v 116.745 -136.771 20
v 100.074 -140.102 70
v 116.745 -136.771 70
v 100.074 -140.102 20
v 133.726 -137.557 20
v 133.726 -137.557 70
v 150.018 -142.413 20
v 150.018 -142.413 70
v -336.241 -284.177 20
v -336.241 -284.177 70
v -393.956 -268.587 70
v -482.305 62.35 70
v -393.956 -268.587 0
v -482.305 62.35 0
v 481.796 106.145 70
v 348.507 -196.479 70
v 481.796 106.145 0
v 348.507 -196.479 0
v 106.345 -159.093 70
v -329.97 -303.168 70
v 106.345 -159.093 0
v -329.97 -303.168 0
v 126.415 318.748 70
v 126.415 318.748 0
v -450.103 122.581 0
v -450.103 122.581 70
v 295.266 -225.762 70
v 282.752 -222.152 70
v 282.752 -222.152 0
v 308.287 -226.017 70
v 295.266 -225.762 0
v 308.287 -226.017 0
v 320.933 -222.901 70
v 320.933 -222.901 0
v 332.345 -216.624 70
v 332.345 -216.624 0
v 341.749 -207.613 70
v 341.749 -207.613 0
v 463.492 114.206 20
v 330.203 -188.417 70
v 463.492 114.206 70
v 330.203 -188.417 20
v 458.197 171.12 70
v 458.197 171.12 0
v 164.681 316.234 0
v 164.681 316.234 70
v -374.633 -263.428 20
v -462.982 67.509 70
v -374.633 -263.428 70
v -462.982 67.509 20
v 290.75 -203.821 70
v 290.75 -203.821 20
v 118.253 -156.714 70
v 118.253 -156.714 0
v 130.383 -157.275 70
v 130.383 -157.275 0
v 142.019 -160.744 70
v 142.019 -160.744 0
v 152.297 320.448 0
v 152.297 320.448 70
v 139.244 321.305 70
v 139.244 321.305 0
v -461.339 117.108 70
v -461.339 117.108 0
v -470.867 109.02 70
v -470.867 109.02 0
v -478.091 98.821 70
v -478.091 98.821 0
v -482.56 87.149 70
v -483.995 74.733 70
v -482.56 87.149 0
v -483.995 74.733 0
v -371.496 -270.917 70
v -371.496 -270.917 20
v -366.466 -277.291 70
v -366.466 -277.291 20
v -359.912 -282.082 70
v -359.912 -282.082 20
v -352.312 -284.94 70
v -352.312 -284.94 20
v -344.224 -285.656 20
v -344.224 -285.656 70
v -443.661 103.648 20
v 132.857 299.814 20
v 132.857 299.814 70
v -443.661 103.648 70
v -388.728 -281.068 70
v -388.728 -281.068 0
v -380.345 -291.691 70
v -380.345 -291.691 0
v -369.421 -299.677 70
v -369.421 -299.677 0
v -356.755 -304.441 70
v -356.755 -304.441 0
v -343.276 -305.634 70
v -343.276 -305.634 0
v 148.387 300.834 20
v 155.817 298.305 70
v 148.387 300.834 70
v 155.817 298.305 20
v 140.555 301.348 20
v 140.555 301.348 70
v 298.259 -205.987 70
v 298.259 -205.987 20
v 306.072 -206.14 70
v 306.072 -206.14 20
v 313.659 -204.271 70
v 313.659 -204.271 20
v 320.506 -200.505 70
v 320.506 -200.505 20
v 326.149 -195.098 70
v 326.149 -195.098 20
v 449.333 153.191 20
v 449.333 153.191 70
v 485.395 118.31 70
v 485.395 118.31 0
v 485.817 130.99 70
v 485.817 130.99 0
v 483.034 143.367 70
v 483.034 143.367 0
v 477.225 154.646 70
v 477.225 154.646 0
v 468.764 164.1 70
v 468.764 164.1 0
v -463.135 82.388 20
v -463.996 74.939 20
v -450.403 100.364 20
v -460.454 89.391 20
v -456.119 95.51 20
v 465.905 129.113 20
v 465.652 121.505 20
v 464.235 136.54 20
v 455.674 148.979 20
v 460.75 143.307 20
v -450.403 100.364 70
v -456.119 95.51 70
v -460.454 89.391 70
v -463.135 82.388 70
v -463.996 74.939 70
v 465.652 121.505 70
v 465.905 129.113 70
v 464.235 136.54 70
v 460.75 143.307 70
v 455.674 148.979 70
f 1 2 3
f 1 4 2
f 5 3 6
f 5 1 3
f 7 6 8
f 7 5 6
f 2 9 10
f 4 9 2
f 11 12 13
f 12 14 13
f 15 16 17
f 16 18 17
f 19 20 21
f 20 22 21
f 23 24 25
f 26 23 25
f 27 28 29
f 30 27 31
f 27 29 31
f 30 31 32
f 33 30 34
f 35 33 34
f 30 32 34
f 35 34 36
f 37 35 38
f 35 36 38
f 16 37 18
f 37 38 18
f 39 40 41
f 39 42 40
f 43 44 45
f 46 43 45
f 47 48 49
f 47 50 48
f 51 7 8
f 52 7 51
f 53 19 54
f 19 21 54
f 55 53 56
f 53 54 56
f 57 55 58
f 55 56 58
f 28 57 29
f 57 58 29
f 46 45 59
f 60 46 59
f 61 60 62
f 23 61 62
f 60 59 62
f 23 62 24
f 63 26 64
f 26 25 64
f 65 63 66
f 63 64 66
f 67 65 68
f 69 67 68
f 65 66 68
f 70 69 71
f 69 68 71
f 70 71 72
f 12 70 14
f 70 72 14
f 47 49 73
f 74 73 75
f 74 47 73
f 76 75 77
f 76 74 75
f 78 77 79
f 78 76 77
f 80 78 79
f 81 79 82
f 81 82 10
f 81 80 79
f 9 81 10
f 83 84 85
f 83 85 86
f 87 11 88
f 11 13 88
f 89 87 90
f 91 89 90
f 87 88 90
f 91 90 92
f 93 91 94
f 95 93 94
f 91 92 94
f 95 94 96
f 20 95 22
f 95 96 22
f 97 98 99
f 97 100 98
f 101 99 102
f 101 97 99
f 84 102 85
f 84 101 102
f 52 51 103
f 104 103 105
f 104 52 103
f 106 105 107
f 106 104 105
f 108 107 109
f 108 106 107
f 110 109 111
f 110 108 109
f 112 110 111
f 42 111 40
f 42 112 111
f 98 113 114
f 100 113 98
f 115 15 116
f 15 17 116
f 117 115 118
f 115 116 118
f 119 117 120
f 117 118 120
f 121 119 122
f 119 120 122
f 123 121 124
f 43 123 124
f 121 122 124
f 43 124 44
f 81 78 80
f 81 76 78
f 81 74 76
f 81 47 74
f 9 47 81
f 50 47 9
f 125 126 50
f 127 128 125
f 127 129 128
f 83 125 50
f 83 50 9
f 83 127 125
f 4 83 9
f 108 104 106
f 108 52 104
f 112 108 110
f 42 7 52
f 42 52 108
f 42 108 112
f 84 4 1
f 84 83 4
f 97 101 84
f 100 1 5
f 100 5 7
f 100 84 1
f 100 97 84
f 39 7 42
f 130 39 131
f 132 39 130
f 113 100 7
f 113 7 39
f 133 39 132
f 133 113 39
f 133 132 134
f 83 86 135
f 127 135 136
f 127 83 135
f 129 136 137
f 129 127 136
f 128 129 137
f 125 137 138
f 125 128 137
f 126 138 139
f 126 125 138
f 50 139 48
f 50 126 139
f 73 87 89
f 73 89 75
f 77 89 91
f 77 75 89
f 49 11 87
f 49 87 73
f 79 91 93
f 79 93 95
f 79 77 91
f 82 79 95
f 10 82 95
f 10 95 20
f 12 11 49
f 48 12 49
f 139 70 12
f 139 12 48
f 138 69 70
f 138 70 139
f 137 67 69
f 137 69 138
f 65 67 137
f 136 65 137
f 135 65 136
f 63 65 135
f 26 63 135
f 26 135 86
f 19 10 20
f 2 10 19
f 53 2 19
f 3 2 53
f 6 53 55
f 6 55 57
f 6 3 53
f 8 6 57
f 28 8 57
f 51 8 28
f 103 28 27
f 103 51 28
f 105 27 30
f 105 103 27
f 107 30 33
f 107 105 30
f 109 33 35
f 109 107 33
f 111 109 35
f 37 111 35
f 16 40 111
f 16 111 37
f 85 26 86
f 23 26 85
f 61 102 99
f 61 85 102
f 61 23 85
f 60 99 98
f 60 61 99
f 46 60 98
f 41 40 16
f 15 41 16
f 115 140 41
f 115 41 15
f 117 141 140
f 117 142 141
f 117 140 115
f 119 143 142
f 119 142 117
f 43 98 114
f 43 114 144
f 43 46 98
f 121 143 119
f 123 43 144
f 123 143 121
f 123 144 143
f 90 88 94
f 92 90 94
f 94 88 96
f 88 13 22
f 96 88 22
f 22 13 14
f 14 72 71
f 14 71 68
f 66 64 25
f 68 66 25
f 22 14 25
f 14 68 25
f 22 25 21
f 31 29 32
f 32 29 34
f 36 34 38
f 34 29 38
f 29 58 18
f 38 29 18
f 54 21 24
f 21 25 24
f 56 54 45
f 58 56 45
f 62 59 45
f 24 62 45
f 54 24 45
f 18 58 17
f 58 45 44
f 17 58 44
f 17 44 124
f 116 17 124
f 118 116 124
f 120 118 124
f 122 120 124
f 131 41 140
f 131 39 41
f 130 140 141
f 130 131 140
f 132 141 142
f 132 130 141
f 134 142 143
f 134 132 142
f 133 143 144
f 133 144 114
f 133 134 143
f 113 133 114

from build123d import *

# Parameters (mm, degrees)
F1_DEPTH = 20
F2_DEPTH = 50
F3_T     = -20


with BuildPart() as f1:
    # F0 (on Top) → F1 (new body)
    with BuildSketch(Plane.XY):
        with BuildLine():
            Line((126.4149565512, 318.7475000366), (-450.1034598535, 122.5814987763))
            ThreePointArc((-450.1034598535, 122.5814987763), (-478.0910883888, 98.8207080739), (-482.3054199281, 62.3498712928))
            Line((-482.3054199281, 62.3498712928), (-393.9558391633, -268.5866574495))
            ThreePointArc((-393.9558391633, -268.5866574495), (-369.4207710673, -299.6767597656), (-329.9698834283, -303.1683916176))
            Line((-329.9698834283, -303.1683916176), (106.3450430495, -159.0930914556))
            ThreePointArc((106.3450430495, -159.0930914556), (124.3346881302, -156.625037143), (142.0194350117, -160.7443028487))
            Line((142.0194350117, -160.7443028487), (282.7517397768, -222.1523142062))
            ThreePointArc((282.7517397768, -222.1523142062), (320.9333231451, -222.9008478399), (348.5065336168, -196.4790448091))
            Line((348.5065336168, -196.4790448091), (481.7955905074, 106.1445162961))
            ThreePointArc((481.7955905074, 106.1445162961), (483.0336988414, 143.3672853444), (458.1969646809, 171.1198362923))
            Line((458.1969646809, 171.1198362923), (164.6807282631, 316.2339391714))
            ThreePointArc((164.6807282631, 316.2339391714), (145.7983966372, 321.3050895289), (126.4149565512, 318.7475000366))
        make_face()
    extrude(amount=F1_DEPTH)

    # F2 (add): a face of the model
    f2_faces = [f1.faces().sort_by_distance(p)[0] for p in [
        (-7.672903893, 13.4350398808, 20),
    ]]
    extrude(f2_faces, amount=F2_DEPTH)

    # F3
    f3_openings = [f1.faces().sort_by_distance(p)[0] for p in [
        (-7.672904, 13.43504, 70),
    ]]
    offset(amount=F3_T, openings=f3_openings)


solid = f1.part
